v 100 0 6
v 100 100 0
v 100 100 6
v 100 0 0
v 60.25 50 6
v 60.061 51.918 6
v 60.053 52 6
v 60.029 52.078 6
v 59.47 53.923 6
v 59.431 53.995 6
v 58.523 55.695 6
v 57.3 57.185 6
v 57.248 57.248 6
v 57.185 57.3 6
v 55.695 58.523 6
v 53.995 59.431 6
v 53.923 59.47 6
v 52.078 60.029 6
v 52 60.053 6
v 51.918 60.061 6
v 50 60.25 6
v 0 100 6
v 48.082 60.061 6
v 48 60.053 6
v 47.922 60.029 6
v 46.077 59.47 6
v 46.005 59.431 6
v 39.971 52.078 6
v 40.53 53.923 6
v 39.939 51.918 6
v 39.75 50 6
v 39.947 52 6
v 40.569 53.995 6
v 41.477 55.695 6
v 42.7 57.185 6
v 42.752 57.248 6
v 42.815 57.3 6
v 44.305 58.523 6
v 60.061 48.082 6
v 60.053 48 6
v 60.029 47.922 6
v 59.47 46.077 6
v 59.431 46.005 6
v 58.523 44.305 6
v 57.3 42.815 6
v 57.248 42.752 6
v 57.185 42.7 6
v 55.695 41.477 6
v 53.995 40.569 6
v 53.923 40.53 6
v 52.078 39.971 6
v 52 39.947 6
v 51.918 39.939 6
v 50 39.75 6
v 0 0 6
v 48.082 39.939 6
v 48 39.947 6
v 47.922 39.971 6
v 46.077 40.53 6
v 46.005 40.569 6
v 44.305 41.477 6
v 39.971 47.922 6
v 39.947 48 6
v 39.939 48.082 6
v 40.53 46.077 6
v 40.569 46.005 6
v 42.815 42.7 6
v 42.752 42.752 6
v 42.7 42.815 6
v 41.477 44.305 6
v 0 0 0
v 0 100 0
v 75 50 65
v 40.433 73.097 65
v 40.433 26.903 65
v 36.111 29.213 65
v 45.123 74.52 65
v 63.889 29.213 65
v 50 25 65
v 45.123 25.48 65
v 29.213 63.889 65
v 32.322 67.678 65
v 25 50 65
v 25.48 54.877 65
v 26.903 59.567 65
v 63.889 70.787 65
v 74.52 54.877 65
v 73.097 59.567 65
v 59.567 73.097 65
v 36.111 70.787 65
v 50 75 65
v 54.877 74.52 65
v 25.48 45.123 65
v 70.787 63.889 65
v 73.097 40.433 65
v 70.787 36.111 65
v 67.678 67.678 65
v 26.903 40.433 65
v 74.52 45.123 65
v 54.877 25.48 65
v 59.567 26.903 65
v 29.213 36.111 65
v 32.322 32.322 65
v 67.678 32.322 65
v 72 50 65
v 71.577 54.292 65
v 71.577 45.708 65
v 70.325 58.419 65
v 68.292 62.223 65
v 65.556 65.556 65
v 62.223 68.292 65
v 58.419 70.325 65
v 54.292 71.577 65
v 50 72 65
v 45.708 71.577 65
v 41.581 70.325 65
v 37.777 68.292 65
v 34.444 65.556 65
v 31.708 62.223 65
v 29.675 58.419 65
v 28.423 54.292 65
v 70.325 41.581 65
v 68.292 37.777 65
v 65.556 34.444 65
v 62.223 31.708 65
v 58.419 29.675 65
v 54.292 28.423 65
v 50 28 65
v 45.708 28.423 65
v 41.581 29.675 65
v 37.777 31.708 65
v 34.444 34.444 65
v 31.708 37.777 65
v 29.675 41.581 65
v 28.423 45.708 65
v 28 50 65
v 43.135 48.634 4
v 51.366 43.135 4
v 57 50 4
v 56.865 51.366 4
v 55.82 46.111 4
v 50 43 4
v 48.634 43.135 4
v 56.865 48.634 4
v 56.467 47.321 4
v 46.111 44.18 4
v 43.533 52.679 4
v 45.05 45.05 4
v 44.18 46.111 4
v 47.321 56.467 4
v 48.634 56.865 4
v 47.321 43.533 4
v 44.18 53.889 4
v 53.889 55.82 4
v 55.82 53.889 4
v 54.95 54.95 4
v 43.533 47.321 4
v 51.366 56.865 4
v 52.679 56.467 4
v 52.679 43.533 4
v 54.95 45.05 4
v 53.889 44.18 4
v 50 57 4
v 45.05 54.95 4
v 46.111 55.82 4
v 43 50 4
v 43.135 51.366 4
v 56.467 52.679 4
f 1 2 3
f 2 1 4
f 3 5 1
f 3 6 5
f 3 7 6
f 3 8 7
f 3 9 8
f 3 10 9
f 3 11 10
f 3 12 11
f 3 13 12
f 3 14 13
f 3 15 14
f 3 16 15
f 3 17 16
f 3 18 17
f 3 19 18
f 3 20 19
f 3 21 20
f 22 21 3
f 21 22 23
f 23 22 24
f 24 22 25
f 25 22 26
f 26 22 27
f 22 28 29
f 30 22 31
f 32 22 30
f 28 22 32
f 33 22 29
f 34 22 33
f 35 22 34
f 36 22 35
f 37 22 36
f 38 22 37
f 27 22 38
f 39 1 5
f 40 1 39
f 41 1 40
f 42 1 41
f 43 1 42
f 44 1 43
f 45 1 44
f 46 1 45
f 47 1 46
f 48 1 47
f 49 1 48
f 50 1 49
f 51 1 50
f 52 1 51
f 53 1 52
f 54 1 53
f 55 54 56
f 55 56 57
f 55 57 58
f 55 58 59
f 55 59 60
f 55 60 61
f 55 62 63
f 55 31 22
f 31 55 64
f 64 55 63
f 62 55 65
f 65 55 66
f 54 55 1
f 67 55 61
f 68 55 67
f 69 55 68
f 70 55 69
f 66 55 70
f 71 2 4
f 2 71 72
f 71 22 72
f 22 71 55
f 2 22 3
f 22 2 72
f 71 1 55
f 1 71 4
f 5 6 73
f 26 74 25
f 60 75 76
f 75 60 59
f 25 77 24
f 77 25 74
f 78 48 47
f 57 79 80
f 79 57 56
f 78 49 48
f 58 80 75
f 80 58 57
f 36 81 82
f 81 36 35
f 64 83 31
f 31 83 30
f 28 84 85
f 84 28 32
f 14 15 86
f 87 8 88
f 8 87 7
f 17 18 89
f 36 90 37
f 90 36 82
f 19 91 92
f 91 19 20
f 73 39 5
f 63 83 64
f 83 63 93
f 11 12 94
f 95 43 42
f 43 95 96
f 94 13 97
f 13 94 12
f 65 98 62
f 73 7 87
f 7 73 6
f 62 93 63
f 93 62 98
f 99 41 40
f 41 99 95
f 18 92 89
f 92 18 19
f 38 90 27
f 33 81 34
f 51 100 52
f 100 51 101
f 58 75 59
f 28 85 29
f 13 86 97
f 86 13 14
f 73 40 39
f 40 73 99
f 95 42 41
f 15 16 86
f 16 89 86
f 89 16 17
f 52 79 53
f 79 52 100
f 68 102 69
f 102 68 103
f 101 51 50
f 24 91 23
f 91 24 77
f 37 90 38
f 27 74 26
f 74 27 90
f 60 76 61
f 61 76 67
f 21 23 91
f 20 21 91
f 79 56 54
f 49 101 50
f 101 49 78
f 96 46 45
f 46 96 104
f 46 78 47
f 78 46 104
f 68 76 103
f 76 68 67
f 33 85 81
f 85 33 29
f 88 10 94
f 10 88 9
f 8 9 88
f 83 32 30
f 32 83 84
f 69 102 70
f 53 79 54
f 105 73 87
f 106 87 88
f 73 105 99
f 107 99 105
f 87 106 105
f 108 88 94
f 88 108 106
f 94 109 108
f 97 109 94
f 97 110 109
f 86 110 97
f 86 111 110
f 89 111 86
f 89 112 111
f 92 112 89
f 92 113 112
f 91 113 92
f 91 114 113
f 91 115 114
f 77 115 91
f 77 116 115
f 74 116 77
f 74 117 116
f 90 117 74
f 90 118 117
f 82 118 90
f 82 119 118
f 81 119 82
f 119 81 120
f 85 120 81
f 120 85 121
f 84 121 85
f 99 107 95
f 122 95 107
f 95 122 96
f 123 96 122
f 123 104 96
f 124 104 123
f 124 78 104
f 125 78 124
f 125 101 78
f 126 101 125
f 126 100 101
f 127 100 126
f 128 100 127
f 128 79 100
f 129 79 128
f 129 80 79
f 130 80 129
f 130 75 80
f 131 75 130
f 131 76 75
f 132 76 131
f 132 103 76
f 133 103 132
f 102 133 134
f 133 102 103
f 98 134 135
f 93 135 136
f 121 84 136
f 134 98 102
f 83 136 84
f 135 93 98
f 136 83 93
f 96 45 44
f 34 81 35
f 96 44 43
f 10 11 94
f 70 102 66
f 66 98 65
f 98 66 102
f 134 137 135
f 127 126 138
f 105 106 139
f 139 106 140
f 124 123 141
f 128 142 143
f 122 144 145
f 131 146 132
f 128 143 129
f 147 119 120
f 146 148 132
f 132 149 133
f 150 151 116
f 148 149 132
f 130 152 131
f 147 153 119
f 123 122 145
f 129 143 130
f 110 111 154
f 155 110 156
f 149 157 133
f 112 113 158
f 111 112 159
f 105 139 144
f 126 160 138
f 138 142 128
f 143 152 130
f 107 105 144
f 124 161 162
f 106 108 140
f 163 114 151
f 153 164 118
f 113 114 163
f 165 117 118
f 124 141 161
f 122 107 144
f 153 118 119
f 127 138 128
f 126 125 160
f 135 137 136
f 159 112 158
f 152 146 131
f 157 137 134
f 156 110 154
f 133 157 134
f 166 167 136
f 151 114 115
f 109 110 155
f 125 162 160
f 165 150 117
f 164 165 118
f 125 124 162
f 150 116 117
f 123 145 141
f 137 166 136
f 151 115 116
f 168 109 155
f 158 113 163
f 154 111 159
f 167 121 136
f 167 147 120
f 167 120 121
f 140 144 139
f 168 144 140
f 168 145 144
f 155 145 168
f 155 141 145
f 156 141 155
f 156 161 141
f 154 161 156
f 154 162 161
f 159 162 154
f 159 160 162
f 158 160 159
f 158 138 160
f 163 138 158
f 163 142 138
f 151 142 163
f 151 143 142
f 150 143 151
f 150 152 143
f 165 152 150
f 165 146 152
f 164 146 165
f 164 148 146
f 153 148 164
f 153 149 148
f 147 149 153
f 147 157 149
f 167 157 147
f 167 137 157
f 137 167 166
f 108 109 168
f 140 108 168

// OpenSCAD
$fn = 32;

// ----------------------------------------------------------------------
// Hopper: funnel with square flange
// ----------------------------------------------------------------------

// --- parameters (mm) ---
fl = 100;                 // flange side, X and Y
fl_t = 6;                 // flange thickness
cone_h = 60;              // cone height above the flange
top_d = 50;               // cone mouth diameter
bot_d = 20;               // cone spout diameter
wall = 3;                 // cone wall thickness
fit_tol = 0.02;           // tolerance for press fits, mm
free_tol = 0.2;           // tolerance for clearance fits, mm

bore_d = bot_d - 2 * wall;  // spout bore diameter
total_h = fl_t + cone_h - 1;  // overall height

difference() {
  union() {
    cube([fl, fl, fl_t]);
    translate([fl / 2, fl / 2, fl_t - 1])
      cylinder(h = cone_h, d1 = bot_d, d2 = top_d);
  }
  translate([fl / 2, fl / 2, fl_t - 2])
    cylinder(h = cone_h + 1, d1 = bore_d, d2 = top_d - 2 * wall);
}
